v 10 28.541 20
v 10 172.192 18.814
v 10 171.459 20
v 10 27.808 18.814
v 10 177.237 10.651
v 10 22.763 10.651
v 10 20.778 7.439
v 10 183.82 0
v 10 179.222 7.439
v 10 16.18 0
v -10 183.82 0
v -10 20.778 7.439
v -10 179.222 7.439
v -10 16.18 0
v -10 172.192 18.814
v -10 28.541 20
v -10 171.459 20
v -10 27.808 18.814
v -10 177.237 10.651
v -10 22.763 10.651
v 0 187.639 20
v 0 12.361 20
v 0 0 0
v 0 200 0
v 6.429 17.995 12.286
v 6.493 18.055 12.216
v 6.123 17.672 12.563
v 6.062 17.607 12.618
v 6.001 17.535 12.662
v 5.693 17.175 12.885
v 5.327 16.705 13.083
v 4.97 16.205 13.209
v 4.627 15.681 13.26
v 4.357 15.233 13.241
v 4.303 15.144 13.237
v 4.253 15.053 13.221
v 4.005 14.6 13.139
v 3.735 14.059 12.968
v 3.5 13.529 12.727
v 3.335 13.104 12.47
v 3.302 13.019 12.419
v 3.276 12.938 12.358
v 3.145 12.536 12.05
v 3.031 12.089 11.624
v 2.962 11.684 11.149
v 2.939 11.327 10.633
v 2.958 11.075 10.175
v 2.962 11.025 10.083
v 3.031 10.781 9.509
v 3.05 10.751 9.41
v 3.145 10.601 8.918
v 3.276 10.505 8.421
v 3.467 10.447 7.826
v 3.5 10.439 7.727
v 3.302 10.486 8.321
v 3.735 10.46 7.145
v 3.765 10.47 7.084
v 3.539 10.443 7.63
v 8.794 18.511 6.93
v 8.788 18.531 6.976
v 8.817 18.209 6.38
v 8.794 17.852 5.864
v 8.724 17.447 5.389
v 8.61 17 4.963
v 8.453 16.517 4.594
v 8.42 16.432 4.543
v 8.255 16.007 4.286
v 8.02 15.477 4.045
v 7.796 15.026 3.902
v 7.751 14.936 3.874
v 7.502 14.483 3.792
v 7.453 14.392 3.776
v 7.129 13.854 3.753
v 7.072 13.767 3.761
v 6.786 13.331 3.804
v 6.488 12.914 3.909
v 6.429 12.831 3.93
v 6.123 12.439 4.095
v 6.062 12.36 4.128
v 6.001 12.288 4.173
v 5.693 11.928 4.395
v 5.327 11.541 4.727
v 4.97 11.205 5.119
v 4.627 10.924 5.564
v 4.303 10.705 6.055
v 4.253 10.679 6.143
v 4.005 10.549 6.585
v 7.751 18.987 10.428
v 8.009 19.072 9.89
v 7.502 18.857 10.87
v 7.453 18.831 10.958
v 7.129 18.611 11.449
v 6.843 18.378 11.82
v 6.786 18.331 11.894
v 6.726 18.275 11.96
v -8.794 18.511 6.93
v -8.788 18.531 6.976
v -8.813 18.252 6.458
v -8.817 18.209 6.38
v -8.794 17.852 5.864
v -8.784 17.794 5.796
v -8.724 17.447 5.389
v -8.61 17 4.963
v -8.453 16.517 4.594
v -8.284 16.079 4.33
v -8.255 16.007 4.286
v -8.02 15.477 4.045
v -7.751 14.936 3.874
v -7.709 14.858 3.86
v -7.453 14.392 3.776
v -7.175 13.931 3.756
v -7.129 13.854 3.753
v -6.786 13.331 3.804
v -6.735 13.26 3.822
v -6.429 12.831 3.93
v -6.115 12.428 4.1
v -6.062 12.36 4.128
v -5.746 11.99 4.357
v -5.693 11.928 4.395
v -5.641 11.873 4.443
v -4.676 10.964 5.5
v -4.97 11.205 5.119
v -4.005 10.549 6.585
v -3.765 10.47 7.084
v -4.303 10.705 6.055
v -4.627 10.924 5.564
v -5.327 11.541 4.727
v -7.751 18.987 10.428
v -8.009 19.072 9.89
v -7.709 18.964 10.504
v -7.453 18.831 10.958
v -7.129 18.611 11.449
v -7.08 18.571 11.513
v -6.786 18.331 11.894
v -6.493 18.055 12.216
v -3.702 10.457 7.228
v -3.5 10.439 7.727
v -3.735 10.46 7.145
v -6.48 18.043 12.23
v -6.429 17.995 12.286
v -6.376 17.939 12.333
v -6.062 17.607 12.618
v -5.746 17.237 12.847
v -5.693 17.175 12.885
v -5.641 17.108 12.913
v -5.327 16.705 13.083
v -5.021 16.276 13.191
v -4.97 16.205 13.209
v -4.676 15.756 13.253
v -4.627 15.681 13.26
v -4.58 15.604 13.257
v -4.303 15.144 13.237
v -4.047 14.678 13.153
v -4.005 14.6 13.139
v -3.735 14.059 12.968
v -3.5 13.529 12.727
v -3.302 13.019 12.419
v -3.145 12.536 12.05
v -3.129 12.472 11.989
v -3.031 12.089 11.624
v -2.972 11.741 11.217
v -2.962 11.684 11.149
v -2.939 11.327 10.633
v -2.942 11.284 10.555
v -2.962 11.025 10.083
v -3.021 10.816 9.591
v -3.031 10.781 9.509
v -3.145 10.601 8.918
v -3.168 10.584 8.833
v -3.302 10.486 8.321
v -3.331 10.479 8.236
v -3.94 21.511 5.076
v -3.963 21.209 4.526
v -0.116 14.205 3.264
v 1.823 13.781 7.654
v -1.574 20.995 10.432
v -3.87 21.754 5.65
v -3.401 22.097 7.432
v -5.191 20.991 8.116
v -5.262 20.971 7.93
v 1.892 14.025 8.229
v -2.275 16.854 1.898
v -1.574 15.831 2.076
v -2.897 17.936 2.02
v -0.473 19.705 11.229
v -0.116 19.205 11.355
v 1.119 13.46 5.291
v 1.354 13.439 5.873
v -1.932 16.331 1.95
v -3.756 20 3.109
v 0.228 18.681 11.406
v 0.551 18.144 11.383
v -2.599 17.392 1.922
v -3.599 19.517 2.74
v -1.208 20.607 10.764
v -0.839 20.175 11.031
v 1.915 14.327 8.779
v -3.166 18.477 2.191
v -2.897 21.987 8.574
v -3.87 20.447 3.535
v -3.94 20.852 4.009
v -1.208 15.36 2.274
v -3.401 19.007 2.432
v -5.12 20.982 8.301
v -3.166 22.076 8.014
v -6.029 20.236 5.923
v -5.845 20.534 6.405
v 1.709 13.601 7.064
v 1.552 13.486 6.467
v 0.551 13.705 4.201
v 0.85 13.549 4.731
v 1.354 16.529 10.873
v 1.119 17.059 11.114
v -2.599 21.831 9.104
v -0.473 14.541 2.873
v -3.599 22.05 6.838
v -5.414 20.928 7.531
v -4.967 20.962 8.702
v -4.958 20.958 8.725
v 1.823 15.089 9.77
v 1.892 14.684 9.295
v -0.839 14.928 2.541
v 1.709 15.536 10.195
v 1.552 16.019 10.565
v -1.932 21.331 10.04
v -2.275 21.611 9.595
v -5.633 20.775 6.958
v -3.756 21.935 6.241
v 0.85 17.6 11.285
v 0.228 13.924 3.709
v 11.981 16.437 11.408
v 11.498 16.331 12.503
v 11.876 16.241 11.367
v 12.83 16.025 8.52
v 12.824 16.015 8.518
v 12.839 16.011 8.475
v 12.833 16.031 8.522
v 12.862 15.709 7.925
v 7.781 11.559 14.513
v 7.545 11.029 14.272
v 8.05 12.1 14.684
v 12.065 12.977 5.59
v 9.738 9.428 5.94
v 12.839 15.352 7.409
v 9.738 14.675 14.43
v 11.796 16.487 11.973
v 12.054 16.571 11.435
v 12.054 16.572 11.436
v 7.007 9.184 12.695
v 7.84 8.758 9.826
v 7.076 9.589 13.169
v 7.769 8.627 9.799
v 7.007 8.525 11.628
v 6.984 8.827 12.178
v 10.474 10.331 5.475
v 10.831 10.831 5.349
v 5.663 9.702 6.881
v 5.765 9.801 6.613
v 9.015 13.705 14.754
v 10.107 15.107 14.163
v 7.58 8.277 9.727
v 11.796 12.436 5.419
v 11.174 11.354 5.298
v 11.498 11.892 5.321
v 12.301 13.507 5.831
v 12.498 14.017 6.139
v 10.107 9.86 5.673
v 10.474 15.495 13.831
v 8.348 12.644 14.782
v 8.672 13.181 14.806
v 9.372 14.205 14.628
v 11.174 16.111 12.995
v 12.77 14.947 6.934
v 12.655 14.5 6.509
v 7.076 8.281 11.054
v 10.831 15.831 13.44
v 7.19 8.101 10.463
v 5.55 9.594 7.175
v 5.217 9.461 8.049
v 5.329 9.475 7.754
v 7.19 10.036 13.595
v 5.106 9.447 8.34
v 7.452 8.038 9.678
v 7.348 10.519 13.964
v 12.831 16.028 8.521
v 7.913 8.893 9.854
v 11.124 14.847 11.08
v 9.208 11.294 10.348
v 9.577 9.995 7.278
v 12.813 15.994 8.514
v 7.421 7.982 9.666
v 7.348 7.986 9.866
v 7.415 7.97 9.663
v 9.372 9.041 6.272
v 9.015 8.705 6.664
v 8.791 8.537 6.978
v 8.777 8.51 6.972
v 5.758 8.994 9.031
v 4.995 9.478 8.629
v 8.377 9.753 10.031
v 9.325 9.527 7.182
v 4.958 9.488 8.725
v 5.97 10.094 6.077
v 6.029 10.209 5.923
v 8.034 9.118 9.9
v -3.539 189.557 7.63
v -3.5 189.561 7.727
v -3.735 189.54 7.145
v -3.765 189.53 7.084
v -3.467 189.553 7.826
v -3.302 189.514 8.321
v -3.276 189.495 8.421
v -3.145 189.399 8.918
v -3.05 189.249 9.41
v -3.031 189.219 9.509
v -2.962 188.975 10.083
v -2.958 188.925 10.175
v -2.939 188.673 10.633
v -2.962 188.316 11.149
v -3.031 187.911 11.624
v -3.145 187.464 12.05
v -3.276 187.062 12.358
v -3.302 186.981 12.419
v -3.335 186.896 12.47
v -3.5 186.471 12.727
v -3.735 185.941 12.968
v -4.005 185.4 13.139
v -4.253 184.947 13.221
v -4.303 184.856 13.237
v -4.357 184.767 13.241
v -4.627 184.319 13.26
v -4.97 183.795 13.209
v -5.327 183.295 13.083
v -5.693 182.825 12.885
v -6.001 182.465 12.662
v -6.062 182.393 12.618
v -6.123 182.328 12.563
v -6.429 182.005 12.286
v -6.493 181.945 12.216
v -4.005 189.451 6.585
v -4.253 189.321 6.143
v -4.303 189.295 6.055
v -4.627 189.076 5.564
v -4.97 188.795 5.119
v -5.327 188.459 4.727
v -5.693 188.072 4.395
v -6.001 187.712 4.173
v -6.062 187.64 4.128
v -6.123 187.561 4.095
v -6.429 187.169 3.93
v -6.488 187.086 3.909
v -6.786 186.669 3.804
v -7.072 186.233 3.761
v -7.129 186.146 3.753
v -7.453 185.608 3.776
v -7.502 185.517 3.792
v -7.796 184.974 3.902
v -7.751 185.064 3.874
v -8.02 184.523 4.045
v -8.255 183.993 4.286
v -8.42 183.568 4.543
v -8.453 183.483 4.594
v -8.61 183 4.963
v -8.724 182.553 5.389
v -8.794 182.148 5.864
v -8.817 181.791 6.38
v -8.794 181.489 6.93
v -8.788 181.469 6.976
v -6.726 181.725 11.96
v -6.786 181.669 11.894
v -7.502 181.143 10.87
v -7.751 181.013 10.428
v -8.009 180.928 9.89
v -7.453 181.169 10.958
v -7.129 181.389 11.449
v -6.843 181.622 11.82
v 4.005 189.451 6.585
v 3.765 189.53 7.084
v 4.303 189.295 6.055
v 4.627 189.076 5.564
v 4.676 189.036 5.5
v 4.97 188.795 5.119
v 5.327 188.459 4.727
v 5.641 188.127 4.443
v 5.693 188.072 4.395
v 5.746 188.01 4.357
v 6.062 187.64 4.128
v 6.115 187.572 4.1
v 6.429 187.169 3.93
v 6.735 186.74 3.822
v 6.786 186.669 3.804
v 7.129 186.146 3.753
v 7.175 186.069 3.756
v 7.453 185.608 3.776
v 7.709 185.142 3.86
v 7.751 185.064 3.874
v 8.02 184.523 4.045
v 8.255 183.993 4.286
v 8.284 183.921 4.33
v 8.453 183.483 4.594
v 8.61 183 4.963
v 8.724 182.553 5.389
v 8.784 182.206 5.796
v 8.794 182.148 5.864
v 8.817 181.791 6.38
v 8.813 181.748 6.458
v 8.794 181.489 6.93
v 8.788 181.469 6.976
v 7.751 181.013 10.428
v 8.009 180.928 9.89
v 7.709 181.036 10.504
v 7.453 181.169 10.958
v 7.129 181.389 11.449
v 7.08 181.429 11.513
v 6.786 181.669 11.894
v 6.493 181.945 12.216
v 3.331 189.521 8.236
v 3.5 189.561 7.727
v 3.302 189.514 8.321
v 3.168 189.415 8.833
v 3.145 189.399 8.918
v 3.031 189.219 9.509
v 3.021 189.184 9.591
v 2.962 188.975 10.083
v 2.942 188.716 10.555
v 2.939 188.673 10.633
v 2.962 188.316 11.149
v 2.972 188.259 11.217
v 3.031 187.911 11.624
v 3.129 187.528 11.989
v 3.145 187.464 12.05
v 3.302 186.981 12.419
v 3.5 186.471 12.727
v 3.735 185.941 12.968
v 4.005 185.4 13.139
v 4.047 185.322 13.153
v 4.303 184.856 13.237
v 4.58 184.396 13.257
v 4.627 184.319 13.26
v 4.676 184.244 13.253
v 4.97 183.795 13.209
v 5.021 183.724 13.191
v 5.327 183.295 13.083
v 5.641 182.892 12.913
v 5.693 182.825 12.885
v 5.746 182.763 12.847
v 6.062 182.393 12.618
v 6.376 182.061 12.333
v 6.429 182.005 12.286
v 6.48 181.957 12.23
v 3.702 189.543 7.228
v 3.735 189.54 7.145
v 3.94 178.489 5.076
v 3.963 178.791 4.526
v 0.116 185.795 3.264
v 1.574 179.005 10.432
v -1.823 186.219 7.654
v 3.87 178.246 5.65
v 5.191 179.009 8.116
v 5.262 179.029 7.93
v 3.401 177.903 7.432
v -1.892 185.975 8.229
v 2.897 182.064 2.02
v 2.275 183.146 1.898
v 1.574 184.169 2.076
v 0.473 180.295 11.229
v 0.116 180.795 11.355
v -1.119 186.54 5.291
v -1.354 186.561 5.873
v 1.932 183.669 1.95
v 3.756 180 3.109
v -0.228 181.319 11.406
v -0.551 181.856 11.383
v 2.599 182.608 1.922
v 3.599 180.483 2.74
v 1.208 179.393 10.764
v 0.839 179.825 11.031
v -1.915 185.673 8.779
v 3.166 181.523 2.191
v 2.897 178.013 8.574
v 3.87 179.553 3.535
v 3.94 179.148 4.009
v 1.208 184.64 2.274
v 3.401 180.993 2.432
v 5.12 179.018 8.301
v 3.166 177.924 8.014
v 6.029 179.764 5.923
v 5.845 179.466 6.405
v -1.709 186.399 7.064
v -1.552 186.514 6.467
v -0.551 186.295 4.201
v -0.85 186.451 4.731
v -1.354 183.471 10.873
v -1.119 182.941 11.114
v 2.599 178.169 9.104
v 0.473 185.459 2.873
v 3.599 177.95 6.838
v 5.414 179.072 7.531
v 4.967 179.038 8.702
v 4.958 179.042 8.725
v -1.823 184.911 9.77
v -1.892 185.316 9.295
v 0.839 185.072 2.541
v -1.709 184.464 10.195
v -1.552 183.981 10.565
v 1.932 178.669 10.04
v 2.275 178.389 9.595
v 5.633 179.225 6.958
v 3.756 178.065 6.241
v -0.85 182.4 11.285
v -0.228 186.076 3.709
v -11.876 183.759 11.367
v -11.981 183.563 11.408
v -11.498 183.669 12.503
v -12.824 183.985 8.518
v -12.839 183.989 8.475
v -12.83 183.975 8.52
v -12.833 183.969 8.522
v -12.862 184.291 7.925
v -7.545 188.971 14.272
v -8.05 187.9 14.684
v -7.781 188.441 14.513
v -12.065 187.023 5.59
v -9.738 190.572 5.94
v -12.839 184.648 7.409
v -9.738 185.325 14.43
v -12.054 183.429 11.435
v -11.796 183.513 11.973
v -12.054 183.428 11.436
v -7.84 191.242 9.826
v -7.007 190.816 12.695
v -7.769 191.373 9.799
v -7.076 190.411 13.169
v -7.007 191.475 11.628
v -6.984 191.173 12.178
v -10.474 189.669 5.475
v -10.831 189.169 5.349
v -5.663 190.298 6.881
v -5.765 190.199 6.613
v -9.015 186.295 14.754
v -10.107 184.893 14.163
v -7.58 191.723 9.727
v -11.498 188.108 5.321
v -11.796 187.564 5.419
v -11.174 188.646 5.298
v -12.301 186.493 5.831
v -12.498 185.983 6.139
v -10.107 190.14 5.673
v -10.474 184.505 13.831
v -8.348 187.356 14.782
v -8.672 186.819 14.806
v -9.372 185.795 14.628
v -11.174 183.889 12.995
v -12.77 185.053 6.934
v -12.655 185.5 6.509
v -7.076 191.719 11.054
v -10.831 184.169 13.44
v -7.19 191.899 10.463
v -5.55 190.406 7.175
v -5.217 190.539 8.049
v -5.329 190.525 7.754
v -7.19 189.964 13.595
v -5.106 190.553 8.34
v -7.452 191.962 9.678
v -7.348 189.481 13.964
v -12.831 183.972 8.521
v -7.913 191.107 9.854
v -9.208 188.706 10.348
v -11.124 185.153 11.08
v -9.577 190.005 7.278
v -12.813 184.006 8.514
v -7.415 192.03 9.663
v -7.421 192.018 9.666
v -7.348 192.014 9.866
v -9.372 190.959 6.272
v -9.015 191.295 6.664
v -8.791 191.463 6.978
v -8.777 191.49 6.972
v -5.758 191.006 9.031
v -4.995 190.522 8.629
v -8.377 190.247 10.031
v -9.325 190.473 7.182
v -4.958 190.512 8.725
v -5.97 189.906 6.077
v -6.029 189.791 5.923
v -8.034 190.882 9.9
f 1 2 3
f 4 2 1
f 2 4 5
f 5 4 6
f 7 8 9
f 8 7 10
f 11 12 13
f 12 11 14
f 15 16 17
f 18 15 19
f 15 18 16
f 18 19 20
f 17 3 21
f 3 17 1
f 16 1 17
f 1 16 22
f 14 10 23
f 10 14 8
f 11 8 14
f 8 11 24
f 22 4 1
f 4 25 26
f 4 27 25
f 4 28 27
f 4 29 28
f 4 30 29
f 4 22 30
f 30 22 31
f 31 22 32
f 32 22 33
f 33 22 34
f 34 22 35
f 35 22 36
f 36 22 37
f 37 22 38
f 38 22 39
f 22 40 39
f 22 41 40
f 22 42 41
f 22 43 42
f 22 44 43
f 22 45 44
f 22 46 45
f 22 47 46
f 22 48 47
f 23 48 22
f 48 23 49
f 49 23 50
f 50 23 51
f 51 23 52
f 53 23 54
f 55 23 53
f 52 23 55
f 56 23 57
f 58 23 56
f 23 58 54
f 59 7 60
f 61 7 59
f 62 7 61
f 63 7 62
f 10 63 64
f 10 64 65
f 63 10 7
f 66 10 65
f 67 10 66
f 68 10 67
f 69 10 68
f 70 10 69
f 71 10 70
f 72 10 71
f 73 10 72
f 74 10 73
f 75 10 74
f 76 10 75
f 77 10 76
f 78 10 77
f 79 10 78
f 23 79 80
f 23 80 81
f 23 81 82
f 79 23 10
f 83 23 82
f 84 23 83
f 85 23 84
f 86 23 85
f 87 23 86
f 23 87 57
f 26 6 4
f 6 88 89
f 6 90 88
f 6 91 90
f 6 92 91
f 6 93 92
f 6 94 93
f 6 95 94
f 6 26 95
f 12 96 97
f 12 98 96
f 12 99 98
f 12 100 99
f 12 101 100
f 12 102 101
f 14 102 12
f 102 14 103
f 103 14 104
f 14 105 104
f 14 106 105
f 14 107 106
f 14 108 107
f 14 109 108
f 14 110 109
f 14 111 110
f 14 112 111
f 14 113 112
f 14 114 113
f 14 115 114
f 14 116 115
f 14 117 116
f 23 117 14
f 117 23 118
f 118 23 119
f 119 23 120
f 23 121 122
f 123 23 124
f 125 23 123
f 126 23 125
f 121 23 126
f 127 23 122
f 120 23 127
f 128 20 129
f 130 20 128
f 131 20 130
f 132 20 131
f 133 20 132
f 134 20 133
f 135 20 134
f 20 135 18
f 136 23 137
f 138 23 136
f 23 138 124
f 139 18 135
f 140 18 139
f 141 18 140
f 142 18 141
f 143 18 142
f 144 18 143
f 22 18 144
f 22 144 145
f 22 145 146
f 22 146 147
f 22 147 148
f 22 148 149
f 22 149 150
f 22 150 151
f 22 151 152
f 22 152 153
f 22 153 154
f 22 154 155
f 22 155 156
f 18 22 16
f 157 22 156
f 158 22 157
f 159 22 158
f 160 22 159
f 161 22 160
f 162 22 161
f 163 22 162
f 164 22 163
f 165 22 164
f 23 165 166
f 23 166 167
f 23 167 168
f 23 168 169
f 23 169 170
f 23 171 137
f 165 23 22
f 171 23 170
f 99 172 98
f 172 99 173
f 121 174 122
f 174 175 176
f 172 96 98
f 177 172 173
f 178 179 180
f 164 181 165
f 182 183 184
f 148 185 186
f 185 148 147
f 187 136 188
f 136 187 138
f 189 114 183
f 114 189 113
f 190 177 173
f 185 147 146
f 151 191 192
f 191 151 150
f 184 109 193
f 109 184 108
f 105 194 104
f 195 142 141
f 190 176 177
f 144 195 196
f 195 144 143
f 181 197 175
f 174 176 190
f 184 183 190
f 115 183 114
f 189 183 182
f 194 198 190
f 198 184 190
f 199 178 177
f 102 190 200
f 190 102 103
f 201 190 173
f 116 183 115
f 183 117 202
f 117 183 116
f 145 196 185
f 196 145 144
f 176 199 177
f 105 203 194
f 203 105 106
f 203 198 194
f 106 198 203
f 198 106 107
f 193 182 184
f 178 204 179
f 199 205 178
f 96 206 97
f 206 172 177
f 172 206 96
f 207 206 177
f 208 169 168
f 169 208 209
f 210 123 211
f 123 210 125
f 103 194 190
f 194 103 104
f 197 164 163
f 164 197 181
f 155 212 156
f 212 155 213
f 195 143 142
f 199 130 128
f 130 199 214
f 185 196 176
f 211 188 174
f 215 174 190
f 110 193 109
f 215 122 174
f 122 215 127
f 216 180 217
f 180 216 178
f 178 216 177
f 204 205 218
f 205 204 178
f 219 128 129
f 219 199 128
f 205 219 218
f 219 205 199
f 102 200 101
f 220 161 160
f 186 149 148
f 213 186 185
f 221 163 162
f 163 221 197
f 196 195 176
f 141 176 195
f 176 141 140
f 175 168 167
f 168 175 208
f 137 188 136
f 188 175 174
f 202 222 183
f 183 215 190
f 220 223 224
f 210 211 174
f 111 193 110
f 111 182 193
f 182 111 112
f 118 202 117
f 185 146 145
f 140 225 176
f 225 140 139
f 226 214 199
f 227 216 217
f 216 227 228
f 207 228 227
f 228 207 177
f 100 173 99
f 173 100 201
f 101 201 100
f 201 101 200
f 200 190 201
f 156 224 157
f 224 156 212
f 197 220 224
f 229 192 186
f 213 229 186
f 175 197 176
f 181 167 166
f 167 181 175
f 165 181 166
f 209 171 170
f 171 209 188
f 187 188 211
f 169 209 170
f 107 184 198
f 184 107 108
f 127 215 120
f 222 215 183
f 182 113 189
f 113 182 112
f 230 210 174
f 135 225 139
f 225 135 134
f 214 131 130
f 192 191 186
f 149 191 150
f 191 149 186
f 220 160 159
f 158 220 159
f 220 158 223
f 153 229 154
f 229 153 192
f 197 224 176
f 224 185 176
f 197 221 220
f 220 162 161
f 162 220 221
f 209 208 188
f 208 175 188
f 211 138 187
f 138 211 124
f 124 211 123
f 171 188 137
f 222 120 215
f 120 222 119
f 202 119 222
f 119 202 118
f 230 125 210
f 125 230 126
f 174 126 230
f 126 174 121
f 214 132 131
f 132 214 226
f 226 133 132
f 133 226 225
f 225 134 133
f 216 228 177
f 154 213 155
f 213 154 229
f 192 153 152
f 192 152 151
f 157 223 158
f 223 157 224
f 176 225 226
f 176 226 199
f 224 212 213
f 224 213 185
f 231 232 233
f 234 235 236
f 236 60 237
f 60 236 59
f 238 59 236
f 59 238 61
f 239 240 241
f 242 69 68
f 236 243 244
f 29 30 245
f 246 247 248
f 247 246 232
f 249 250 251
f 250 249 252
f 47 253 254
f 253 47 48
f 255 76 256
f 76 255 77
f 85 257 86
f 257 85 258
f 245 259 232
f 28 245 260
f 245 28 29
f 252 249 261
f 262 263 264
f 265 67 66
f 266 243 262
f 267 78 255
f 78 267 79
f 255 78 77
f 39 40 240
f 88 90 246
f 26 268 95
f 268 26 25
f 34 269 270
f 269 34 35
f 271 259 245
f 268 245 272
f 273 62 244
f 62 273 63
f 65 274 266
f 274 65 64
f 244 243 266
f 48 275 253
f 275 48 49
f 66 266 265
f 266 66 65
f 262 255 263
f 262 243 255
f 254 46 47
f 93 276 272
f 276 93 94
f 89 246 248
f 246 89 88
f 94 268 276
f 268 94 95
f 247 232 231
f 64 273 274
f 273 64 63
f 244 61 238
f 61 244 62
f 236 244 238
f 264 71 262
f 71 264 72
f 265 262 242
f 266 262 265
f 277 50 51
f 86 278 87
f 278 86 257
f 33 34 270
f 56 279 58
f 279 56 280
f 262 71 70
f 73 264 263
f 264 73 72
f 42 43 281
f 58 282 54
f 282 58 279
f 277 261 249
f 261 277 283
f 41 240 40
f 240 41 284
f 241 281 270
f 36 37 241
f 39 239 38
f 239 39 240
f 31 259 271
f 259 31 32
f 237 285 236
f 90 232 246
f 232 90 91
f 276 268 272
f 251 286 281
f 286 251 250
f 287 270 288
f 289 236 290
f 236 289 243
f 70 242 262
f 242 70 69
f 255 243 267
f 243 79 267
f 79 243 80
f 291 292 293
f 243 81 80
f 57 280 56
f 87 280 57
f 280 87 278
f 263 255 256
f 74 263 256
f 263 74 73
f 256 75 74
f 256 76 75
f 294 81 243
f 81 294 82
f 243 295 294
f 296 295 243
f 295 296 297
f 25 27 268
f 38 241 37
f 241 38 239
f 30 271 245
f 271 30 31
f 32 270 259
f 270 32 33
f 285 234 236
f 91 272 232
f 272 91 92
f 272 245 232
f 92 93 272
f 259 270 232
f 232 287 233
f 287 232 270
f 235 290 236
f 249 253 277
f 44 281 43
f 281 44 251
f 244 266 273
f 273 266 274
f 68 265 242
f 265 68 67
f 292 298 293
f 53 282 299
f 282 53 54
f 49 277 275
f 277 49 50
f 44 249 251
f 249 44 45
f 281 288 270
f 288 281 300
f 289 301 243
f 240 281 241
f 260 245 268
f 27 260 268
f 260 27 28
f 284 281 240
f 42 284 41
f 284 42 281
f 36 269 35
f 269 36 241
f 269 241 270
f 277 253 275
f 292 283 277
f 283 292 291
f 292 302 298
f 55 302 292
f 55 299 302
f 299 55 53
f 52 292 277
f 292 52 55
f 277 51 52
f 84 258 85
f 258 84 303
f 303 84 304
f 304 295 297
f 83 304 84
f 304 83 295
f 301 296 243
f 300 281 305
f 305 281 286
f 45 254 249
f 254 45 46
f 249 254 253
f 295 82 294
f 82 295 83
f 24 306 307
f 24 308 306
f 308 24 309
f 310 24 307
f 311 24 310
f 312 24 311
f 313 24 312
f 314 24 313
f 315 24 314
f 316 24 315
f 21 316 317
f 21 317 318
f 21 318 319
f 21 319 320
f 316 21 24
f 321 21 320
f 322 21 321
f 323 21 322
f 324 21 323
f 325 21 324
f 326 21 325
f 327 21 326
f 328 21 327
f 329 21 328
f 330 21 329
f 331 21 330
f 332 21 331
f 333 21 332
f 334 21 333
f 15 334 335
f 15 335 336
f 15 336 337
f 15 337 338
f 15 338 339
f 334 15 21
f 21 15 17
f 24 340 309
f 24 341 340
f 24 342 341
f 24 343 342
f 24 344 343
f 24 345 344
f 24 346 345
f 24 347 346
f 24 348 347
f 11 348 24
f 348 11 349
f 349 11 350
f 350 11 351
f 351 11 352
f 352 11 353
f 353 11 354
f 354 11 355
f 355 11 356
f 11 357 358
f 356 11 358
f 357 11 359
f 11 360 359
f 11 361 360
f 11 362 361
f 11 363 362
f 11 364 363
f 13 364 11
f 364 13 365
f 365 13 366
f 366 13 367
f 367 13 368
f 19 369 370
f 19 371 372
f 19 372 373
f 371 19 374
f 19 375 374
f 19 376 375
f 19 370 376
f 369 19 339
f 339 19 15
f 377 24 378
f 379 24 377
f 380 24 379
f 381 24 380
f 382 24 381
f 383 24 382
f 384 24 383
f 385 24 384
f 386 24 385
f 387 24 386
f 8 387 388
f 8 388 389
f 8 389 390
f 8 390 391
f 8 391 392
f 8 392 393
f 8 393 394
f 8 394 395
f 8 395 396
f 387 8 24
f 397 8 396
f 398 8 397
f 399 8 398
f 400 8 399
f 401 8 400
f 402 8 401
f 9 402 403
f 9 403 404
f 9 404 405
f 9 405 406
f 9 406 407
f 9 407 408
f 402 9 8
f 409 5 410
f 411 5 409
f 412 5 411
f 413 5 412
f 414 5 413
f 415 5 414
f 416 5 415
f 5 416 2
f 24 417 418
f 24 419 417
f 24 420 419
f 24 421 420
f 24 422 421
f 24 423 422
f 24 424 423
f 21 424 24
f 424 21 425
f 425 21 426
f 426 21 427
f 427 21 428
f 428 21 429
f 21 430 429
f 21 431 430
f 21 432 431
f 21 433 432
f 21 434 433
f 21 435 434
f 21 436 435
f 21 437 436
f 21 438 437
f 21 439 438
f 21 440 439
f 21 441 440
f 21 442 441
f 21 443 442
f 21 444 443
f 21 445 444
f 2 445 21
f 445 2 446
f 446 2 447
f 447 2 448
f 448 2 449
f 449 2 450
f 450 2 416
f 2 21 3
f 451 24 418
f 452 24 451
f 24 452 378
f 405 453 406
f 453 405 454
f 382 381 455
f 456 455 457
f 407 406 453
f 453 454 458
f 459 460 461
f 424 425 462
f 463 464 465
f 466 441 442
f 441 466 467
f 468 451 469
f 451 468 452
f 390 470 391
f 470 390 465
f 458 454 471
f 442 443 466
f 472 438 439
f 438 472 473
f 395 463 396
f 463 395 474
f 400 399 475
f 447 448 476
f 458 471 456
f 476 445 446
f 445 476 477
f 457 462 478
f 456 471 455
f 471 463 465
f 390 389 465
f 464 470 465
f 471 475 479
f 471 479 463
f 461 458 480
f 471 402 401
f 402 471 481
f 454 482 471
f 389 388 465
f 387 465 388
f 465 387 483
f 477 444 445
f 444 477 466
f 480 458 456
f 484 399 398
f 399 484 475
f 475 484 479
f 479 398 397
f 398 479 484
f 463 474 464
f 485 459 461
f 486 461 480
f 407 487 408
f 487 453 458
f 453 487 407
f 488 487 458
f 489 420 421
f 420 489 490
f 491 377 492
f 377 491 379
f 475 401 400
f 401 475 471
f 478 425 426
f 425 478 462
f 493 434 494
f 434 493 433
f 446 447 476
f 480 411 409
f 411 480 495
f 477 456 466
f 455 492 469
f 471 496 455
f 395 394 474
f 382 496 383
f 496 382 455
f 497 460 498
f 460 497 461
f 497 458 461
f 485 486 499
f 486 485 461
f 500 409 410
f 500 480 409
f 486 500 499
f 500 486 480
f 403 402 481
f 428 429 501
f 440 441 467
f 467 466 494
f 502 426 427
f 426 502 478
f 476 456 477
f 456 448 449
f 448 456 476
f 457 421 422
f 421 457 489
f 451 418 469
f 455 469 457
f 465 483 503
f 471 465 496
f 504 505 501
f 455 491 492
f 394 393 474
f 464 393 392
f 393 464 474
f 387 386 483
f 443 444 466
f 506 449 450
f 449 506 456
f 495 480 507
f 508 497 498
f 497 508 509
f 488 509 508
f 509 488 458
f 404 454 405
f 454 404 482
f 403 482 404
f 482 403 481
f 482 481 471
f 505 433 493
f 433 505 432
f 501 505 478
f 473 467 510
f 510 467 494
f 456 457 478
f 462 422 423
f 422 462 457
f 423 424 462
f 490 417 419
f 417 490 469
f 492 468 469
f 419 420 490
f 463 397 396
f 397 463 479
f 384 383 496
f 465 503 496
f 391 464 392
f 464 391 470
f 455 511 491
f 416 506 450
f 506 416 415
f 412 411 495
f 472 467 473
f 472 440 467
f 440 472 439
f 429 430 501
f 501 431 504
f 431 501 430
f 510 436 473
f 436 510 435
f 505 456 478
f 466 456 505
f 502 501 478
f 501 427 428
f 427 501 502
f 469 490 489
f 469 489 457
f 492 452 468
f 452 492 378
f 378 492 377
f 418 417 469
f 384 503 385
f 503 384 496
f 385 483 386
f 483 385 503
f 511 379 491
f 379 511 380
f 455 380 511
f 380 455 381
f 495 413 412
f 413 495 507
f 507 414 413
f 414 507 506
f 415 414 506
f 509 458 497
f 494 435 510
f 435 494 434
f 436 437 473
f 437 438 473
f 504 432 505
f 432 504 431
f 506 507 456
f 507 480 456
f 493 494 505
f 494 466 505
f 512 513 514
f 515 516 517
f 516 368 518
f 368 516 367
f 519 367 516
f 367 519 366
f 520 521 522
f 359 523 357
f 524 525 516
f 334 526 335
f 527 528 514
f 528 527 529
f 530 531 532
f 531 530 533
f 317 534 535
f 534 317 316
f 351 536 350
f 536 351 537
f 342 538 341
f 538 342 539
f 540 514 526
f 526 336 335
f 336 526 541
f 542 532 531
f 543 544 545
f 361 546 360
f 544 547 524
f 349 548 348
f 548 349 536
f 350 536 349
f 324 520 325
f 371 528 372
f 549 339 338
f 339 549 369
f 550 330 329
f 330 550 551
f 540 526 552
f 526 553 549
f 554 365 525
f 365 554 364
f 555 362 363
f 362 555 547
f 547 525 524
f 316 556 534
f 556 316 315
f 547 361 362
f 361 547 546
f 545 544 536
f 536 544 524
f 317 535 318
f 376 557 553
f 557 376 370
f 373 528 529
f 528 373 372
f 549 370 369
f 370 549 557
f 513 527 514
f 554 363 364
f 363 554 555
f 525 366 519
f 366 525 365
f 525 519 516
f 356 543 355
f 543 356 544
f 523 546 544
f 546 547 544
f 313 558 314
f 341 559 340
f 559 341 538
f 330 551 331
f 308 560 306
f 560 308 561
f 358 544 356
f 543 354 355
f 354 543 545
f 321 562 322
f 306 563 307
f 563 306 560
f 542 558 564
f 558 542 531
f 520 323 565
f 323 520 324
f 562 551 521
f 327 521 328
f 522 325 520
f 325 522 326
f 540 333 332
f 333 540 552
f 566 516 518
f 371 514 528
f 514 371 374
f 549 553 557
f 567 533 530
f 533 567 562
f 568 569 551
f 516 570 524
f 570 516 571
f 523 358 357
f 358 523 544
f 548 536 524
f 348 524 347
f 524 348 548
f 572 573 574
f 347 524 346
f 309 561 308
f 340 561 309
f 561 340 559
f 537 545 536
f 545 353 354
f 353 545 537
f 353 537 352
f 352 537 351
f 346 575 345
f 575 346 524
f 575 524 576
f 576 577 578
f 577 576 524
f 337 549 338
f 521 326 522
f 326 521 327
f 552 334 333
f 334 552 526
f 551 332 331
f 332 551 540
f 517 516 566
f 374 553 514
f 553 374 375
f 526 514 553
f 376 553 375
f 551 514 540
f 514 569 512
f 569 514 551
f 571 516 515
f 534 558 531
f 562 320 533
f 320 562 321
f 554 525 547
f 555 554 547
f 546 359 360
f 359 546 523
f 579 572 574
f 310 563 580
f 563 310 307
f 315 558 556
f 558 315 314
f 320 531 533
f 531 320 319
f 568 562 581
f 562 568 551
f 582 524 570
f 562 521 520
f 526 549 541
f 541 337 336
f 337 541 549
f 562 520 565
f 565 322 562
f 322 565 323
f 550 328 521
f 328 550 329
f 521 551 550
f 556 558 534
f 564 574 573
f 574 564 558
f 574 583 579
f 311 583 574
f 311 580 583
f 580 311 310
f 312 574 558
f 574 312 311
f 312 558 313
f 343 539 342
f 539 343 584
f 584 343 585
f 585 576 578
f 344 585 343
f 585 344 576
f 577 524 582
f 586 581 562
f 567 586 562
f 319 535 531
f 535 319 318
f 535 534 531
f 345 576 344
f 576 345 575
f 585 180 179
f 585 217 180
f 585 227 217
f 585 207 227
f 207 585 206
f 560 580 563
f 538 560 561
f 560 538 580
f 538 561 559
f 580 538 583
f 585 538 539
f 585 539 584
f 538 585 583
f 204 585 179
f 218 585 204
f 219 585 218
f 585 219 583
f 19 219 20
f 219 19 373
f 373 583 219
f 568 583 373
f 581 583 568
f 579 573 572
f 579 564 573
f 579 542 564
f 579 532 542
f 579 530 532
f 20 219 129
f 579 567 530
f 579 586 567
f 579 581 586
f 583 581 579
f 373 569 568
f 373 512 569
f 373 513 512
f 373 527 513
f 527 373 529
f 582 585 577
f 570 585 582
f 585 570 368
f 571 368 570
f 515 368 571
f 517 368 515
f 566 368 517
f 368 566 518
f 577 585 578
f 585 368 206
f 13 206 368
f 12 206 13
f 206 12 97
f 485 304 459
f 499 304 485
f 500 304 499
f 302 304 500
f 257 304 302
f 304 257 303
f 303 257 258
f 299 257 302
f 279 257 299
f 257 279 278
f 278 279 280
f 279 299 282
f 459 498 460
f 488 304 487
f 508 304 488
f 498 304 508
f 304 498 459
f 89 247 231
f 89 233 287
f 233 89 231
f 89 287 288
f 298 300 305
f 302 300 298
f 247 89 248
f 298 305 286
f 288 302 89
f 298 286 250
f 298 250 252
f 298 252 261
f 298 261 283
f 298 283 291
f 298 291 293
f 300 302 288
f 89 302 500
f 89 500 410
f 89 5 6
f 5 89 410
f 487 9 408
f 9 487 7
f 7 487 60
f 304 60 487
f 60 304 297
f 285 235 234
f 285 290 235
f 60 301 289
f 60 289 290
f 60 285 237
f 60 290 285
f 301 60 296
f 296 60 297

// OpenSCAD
edge_width = 20;
edge_height = 20;
slot_width = 3;
slot_depth = 5;
length = 200;
element = 1; // 1 = Build element ; other = Build icosahedron

PHI = (1 + sqrt(5)) / 2; // Golden ratio
ALPHA = 90 - atan(PHI);
dihedral_angle = 180 - asin(2/3);
angle1 = ALPHA;
angle2 = 108 / 2;

$fn = 50*1;

module tip(length=5) {
    union() {
        rotate([-angle1, 0, 0])
            rotate([0, angle2, 0])
                translate([10, edge_height-5, -1])
                    cylinder(6, 5, 5);
        difference() {
            translate([0, edge_height/2, -length/2])
                cube([edge_width, edge_height, length], center=true);
            rotate([-angle1, 0, 0])
                translate([0, edge_height*0.6, edge_height*0.3])
                    cube([edge_width*1.2, edge_height*1.2, edge_height*0.6], center=true);
            rotate([-angle1, 0, 0])
                rotate([0, angle2, 0])
                    cube([edge_width, edge_height*1.8, edge_height*0.5]);
            rotate([-angle1, 0, 0])
                rotate([0, -90-angle2, 0])
                    cube([edge_height*0.5, edge_height*1.8, edge_width]);
            mirror([-1,0,0])
                    rotate([-angle1, 0, 0])
                        rotate([0, angle2, 0])
                            translate([10, edge_height-5, -6])
                                cylinder(7, 5, 5);
        }
    }
}

module edge(length=5) {
    difference() {
        union() {
            tip(length / 2);
            translate([0, 0, -length])
                //mirror([0, 0, 1])
               rotate([0, 180, 0])
                    tip(length / 2);
        }
        translate([-(edge_width+3*slot_depth)/2+slot_depth,edge_width/2,-length/2])
            rotate([0, 0, -90+dihedral_angle/2])
                cube([slot_depth*3, slot_width, length], center=true);
        translate([(edge_width+3*slot_depth)/2-slot_depth,edge_width/2,-length/2])
            rotate([0, 0, 90-dihedral_angle/2])
                cube([slot_depth*3, slot_width, length], center=true);
    }
}

module flower(length=5, l2=0, nb=5) {
    for (i = [0:nb-1]) {
        rotate([0, 0, i*360/5])
            rotate([90-angle1, 0, 0])
                rotate([0, 0, 180])
                    translate([0,0,-l2/2])
                        edge(length-l2);
    }
}

module flower2(length=5, l2=0, nb=5) {
    for (i = [0:nb-1]) {
        rotate([0, 0, i*360/5])
            rotate([90-angle1, 0, 0])
                rotate([0, 0, 180])
                    translate([0,0,-l2/2-10])
                        edge(length-l2);
    }
}

module isocaedron(l=5, l2=5) {
    translate([+l/2*PHI, +l/2, 0]) rotate([-ALPHA, 90, 0]) rotate([0, 0, -360/5/2]) flower(l, l2, 3);
    translate([+l/2, 0, +l/2*PHI]) rotate([+ALPHA, 0, 90]) rotate([0, 0, -360/5]) flower(l, l2, 3);
    translate([0, +l/2*PHI, +l/2]) rotate([-90+ALPHA, 0, 0]) rotate([0, 0, 5*360/5]) flower(l, l2, 3);
    translate([-l/2, 0, +l/2*PHI]) rotate([-ALPHA, 0, 90]) rotate([0, 0, -360/5/2]) flower(l, l2, 3);
    translate([0, -l/2*PHI, +l/2]) rotate([90-ALPHA, 0, 0]) rotate([0, 0, 3*360/5/2]) flower(l, l2, 3);
    translate([+l/2*PHI, -l/2, 0]) rotate([ALPHA, 90, 0]) rotate([0, 0, -360/5]) flower(l, l2, 3);
    translate([0, -l/2*PHI, -l/2]) rotate([90+ALPHA, 0, 0]) rotate([0, 0, 2*360/5]) flower(l, l2, 3);
    translate([-l/2*PHI, -l/2, 0]) rotate([180-ALPHA, 90, 0]) rotate([0, 0, 5*360/5/2]) flower(l, l2, 3);
    translate([+l/2, 0, -l/2*PHI]) rotate([180-ALPHA, 0, 90]) rotate([0, 0, 5*360/5/2]) flower(l, l2, 3);
    translate([-l/2*PHI, +l/2, 0]) rotate([180+ALPHA, 90, 0]) rotate([0, 0, 3*360/5]) flower(l, l2, 1);
    translate([0, +l/2*PHI, -l/2]) rotate([-90-ALPHA, 0, 0]) rotate([0, 0, 360/5/2]) flower(l, l2, 1);
    translate([-l/2, 0, -l/2*PHI]) rotate([180+ALPHA, 0, 90]) rotate([0, 0, 3*360/5]) flower(l, l2, 1);
}

if (element == 1)
    rotate([90, 0, 0])
        edge(length);
else
    isocaedron(length, (sin($t*360)+1)*length/10);
